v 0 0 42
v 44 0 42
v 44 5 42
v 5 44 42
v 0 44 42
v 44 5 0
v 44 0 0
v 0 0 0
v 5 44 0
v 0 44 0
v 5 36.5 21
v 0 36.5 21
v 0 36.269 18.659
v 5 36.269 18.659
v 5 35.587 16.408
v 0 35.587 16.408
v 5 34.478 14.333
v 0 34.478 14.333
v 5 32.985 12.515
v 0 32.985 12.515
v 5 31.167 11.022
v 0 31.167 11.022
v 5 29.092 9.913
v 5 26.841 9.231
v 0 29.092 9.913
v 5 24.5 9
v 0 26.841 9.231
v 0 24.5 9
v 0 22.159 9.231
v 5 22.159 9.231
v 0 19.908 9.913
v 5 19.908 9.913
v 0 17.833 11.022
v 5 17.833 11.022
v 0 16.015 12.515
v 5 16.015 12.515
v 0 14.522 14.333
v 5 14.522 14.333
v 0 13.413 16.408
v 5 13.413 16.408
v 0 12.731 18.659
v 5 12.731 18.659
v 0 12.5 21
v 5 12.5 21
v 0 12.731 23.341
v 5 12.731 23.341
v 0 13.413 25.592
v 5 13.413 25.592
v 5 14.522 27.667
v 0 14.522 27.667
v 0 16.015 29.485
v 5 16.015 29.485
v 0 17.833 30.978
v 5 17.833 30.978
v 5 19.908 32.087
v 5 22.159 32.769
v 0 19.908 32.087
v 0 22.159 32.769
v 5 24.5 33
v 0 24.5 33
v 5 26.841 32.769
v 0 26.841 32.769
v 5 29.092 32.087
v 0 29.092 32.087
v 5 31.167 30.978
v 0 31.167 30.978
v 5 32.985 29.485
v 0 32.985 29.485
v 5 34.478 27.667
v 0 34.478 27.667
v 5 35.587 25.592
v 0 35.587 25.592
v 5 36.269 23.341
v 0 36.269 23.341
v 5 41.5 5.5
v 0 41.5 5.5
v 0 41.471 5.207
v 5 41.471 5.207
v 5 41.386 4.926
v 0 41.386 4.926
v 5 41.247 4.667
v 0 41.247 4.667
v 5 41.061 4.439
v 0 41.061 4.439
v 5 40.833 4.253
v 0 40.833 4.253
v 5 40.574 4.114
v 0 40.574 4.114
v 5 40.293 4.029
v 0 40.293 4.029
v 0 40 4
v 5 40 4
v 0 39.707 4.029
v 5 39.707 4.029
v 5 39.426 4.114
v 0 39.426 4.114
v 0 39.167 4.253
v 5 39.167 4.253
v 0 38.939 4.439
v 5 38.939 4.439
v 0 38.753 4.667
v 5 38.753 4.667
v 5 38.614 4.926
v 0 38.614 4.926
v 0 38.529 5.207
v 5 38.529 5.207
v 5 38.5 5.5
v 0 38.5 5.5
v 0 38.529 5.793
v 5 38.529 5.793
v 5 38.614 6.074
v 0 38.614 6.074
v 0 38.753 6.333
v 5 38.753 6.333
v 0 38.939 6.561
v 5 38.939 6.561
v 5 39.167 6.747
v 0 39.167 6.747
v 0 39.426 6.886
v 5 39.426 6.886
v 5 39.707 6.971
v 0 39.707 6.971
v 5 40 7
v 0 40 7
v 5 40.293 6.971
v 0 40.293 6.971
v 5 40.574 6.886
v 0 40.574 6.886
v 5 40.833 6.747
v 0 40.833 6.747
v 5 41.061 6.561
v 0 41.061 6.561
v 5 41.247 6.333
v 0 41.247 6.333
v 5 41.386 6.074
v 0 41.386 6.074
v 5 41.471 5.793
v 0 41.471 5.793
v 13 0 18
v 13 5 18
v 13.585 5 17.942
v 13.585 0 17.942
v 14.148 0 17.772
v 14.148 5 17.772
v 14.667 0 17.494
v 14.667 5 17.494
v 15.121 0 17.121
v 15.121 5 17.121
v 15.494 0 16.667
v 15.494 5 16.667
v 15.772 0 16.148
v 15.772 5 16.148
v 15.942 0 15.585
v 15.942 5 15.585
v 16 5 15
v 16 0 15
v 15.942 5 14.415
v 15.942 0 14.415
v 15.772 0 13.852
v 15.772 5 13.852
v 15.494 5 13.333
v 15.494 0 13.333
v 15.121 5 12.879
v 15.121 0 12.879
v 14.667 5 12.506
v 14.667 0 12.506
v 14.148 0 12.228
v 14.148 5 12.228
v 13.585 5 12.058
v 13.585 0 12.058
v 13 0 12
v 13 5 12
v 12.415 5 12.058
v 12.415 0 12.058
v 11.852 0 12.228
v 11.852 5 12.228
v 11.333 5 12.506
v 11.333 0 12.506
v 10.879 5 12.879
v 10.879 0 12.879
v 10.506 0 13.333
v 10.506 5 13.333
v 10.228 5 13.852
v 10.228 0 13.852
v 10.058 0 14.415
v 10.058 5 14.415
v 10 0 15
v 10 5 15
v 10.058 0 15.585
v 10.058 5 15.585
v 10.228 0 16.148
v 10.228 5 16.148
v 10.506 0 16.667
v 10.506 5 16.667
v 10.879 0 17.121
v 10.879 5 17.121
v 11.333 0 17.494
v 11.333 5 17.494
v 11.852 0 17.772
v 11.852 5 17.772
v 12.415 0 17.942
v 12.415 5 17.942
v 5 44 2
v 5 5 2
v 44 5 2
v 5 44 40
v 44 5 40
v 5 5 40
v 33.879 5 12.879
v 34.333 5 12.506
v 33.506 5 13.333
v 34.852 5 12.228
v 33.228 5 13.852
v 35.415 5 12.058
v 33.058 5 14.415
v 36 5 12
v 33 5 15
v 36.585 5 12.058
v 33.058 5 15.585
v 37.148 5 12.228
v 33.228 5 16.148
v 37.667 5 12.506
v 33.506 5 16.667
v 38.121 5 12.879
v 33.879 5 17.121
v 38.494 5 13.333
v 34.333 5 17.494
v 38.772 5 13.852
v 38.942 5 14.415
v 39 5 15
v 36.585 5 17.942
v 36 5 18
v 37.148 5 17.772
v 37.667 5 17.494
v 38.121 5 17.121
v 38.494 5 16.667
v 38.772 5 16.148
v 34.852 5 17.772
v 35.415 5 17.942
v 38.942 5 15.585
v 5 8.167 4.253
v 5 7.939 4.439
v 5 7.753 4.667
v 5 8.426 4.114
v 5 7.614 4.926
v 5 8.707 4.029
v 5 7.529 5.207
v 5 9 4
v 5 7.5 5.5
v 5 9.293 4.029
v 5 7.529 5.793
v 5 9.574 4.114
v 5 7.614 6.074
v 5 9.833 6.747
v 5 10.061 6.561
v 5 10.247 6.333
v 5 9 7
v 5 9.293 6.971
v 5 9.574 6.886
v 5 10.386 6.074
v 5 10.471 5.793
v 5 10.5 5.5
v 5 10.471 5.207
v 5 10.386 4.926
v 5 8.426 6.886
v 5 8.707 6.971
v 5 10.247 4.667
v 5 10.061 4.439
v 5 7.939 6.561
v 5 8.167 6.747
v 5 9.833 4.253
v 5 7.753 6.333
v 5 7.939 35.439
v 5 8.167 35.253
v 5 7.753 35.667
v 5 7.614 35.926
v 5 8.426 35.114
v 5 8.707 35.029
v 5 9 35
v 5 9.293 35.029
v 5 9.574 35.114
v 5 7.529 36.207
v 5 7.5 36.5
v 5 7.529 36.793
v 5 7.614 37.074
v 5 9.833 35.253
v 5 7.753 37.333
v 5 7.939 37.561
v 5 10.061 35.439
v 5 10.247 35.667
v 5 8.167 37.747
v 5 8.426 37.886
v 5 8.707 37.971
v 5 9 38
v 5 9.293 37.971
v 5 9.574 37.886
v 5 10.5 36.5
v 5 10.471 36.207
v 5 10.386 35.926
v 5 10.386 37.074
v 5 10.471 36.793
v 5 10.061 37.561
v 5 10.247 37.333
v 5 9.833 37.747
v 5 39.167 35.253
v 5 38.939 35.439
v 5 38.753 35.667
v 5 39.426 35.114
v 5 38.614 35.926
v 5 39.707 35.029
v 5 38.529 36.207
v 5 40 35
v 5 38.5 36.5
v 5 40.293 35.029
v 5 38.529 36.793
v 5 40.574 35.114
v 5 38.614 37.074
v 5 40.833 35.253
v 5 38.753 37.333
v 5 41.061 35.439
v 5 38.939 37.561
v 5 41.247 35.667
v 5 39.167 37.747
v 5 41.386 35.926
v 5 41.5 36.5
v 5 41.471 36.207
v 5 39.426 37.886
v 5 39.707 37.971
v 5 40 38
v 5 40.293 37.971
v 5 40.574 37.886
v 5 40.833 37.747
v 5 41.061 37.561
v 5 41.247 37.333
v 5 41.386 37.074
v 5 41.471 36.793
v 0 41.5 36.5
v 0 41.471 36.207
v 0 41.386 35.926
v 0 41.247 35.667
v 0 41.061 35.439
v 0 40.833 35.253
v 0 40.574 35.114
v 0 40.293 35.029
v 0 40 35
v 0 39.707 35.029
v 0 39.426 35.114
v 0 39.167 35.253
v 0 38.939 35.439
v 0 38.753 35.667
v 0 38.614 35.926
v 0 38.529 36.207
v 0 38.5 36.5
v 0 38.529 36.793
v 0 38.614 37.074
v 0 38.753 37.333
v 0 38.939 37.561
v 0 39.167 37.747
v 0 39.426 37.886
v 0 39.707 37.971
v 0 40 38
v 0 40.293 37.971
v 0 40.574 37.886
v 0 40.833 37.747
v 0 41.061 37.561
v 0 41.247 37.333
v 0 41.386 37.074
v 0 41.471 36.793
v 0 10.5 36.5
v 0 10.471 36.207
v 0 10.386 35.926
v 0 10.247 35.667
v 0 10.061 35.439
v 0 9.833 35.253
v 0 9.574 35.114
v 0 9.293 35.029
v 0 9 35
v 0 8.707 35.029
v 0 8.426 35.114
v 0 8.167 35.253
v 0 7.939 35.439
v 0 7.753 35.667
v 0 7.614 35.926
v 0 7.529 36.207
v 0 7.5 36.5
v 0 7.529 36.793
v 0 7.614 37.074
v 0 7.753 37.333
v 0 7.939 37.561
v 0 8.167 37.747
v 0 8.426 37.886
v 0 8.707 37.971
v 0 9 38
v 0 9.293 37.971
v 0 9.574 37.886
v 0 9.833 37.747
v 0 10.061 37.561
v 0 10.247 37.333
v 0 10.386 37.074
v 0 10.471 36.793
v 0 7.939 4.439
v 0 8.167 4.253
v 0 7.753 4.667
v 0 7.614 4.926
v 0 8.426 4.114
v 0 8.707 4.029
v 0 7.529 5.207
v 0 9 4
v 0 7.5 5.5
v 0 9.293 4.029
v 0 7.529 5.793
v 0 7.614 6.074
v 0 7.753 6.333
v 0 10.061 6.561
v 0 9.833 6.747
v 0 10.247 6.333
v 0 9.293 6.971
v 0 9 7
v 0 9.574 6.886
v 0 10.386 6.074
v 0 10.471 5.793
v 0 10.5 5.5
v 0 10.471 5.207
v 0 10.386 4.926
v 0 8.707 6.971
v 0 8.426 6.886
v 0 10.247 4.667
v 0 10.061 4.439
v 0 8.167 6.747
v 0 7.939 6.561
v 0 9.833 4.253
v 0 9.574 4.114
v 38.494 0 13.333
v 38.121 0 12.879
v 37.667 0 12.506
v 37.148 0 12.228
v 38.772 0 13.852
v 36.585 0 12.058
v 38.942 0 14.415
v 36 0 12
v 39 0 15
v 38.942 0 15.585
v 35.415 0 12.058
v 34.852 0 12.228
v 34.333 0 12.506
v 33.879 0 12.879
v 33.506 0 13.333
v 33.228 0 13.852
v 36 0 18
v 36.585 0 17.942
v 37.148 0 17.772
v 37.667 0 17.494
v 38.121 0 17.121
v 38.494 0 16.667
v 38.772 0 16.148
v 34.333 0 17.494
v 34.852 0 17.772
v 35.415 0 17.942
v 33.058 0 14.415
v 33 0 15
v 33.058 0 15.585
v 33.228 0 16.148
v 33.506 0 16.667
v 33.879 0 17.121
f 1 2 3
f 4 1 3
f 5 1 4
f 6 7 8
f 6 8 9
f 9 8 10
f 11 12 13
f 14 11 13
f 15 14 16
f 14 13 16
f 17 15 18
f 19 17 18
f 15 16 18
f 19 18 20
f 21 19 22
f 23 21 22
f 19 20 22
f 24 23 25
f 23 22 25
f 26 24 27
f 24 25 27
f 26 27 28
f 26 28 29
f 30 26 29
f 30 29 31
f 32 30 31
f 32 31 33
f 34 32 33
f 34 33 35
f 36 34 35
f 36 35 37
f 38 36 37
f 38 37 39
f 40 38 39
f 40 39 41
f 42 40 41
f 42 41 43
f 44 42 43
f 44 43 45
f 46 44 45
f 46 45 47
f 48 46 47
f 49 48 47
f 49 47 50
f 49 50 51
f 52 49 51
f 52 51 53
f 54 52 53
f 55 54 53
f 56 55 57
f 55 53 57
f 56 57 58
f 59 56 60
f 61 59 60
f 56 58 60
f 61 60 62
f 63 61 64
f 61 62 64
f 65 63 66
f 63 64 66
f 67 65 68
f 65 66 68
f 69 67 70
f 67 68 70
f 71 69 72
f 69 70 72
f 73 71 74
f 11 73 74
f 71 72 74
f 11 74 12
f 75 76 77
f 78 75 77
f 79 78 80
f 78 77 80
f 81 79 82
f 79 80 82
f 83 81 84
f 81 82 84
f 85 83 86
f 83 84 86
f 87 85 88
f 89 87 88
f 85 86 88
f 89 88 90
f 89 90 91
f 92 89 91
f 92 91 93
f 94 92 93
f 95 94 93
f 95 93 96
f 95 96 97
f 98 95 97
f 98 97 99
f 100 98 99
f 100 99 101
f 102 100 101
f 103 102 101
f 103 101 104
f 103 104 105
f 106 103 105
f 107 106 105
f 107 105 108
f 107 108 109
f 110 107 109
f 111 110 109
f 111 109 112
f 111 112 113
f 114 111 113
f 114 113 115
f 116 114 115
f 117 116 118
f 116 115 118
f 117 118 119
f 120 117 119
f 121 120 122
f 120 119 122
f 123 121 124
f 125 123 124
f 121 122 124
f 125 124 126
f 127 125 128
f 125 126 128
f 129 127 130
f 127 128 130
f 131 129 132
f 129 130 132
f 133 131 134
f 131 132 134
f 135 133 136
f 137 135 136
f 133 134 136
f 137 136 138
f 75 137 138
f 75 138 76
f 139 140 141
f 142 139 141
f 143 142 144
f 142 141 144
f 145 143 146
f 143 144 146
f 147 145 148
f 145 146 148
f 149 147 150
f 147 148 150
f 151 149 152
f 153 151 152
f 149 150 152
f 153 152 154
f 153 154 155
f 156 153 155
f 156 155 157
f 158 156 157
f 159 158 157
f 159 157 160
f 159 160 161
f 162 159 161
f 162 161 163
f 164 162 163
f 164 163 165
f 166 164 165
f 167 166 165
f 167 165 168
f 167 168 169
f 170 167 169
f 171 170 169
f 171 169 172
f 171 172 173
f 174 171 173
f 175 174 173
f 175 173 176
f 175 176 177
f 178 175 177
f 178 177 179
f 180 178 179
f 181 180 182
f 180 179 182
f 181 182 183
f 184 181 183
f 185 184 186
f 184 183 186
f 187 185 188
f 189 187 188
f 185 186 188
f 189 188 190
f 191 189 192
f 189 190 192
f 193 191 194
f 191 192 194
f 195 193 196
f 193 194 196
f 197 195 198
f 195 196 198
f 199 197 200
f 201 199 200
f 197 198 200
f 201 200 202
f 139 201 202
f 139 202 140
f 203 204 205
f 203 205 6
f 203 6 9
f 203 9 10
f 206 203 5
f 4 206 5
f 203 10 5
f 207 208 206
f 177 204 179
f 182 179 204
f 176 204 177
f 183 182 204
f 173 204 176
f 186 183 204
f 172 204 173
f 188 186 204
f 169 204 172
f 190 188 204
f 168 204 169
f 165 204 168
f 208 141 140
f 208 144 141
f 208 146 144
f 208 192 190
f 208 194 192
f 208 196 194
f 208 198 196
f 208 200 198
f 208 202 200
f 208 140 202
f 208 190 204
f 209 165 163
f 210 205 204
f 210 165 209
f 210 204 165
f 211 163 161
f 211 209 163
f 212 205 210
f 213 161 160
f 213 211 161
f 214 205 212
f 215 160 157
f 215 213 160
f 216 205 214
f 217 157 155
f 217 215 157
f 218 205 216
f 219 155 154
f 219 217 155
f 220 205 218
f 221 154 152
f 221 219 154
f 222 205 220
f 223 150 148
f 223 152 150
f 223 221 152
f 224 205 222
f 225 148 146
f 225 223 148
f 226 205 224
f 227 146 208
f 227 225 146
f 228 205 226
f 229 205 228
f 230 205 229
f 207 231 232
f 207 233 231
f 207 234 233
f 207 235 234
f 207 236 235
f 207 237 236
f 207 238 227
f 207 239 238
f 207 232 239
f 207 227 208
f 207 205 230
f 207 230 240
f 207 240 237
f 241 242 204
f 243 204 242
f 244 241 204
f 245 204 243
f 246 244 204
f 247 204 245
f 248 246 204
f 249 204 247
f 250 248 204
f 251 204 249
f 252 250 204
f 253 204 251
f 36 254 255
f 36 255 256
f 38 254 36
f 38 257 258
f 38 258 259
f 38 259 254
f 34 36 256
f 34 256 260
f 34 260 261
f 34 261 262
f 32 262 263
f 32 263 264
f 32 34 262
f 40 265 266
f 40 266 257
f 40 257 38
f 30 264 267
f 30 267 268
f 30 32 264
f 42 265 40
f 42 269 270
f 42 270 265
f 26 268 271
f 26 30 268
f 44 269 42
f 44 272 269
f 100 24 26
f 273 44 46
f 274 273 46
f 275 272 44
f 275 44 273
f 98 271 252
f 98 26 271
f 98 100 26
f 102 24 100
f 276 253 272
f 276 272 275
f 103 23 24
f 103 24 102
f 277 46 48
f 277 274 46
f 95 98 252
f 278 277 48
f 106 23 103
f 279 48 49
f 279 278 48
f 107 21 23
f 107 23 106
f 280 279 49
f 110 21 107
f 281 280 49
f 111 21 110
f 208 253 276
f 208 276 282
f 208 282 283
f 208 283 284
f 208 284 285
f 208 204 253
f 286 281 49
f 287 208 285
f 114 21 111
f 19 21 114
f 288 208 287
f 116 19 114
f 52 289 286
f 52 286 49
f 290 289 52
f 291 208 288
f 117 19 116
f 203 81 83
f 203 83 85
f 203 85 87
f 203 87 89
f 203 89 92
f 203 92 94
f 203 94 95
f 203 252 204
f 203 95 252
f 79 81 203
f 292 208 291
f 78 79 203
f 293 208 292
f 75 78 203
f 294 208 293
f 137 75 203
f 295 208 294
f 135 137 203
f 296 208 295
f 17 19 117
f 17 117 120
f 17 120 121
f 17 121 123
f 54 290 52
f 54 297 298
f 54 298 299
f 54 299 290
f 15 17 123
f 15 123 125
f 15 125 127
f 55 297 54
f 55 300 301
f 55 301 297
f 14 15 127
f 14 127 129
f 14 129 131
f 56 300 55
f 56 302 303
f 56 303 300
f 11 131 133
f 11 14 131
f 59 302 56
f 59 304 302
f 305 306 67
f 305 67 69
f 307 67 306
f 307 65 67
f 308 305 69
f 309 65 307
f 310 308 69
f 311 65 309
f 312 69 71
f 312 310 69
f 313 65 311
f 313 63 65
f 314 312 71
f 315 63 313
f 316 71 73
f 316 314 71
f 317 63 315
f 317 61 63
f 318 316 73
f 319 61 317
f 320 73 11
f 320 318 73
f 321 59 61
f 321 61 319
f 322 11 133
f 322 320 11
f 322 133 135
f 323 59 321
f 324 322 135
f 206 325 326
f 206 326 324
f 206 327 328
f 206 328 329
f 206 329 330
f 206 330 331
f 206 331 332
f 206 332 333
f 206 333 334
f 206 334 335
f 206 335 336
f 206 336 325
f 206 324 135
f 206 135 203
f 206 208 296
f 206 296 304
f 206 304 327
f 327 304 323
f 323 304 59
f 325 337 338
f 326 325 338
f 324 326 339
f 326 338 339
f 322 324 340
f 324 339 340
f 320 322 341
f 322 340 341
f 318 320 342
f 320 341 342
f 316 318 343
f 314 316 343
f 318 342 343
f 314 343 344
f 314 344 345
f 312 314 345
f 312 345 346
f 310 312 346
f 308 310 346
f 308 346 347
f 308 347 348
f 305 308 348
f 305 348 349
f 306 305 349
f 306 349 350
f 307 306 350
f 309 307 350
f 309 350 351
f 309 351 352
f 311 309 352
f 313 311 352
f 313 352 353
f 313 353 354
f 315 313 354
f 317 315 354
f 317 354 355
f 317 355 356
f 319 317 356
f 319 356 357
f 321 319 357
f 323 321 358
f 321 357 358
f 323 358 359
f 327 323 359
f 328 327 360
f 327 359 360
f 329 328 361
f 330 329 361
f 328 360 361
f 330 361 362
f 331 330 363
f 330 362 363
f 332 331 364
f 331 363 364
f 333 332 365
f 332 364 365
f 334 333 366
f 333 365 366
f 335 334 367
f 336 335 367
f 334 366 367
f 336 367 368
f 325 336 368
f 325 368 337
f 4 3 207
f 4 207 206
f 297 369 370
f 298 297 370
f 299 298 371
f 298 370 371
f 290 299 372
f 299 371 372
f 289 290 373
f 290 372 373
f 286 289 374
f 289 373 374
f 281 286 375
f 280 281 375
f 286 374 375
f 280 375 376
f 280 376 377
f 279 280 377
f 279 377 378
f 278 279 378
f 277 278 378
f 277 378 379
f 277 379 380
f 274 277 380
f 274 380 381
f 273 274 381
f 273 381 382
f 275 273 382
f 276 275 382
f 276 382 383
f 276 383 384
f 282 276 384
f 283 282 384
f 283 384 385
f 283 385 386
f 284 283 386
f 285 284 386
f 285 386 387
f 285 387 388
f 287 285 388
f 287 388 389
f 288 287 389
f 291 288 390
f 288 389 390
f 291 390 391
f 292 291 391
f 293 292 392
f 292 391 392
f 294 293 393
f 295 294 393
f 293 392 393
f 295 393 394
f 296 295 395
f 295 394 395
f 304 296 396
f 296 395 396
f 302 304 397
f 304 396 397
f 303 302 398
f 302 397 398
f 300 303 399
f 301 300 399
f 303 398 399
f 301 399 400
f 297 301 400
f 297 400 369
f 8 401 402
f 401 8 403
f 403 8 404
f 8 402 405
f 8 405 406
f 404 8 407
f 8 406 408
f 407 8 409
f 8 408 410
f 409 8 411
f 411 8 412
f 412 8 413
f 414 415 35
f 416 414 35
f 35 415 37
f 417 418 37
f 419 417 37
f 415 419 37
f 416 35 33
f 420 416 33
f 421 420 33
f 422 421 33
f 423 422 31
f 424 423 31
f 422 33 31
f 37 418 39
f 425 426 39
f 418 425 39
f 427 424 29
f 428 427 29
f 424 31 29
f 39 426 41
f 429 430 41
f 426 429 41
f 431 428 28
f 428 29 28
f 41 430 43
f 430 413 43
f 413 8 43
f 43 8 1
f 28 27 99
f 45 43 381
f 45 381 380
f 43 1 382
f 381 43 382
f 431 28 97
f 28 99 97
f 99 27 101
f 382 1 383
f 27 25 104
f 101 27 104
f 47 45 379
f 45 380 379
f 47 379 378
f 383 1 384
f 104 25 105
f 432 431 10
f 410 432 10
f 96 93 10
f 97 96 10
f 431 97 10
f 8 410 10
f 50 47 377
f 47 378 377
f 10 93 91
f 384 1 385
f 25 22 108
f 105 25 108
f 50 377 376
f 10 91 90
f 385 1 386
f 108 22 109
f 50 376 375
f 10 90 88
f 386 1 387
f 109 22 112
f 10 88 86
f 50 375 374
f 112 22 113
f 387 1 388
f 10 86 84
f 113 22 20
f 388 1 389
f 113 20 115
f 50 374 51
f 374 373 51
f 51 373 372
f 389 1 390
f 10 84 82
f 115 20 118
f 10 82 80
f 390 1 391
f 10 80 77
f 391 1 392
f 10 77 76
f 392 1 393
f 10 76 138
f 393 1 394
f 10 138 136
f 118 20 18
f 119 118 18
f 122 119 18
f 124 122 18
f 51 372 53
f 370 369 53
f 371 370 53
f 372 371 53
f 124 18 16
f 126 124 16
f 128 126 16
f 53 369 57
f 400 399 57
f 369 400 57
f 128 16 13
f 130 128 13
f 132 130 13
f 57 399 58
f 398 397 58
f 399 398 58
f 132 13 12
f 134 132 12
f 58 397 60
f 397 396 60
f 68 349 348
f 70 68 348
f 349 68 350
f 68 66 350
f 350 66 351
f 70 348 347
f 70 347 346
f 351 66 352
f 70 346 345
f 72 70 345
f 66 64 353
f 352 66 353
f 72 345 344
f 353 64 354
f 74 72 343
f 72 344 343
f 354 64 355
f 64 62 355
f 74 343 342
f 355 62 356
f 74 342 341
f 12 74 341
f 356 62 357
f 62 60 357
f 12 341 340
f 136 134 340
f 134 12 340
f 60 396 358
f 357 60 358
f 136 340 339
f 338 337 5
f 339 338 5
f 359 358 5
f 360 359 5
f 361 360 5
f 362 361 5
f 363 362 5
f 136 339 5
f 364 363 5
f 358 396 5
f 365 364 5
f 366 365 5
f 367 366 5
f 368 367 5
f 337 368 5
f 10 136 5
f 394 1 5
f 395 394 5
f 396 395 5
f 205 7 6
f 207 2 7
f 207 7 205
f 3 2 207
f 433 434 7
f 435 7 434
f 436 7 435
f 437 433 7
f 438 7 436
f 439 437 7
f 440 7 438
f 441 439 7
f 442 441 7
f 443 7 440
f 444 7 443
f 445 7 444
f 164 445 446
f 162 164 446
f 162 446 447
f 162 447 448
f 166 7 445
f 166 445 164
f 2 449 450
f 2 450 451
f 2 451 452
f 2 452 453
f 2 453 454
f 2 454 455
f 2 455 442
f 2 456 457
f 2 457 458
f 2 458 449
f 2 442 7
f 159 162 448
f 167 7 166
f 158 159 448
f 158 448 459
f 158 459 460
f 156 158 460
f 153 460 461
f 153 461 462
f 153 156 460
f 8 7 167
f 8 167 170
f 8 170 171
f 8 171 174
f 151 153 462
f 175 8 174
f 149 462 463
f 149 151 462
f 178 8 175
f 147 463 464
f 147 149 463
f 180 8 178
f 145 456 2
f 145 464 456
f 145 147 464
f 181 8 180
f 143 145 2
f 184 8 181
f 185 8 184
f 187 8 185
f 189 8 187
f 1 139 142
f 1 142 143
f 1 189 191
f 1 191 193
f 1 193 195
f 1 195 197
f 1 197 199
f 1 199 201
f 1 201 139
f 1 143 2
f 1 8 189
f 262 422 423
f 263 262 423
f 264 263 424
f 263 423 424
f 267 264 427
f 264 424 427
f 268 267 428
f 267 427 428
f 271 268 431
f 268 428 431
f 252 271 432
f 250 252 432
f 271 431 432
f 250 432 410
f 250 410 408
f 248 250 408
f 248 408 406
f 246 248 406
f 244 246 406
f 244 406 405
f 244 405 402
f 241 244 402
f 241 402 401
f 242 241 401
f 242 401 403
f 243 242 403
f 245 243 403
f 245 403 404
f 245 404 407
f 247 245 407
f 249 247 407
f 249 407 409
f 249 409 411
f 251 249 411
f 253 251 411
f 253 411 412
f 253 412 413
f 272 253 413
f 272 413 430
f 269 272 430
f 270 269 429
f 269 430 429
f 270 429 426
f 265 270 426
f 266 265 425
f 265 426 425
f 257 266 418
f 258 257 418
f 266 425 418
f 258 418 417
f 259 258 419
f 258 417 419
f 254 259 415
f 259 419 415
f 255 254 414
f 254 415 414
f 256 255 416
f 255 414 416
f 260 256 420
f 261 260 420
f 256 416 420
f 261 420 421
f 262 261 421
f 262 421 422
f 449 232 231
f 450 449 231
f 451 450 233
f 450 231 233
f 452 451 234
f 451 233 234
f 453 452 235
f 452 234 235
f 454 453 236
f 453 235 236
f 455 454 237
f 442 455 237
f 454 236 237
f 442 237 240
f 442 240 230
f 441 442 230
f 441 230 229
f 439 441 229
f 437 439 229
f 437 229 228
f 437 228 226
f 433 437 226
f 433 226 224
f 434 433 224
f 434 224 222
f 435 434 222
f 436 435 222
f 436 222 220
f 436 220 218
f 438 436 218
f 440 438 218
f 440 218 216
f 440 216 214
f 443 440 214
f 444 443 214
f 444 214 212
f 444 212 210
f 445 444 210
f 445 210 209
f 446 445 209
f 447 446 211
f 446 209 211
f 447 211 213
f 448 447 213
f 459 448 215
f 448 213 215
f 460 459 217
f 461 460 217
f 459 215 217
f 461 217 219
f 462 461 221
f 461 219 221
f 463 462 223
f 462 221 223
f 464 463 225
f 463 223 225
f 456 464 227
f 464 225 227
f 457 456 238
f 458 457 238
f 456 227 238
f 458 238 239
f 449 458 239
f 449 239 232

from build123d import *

# Parameters (mm, degrees)
SKETCH_W        = 44
SKETCH_H        = 42.000069
PAD_DEPTH       = 44
SKETCH001_W     = 39
SKETCH001_H     = 38.000069
POCKET_DEPTH    = 39
POCKET001_DEPTH = 42.001069
SKETCH003_R     = 1.5
SKETCH003_R_2   = 12
POCKET002_DEPTH = 44.001
SKETCH004_R     = 3
POCKET003_DEPTH = 5.001


with BuildPart() as part:
    # Sketch → Pad (new body)
    with BuildSketch(Plane.YZ):
        with Locations((22, 21.000034)):
            Rectangle(SKETCH_W, SKETCH_H)
    extrude(amount=PAD_DEPTH)

    # Sketch001 (on Face6 of Pad) → Pocket (cut)
    with BuildSketch(Plane.YZ.offset(44)):
        with Locations((24.5, 21.000034)):
            Rectangle(SKETCH001_W, SKETCH001_H)
    extrude(amount=-POCKET_DEPTH, mode=Mode.SUBTRACT)

    # Sketch002 (on Face6 of Pocket) → Pocket001 (cut, through all)
    with BuildSketch(Plane(origin=(0, 0, 42.000069), x_dir=(0, -1, 0), z_dir=(0, 0, 1))):
        Polygon((-44, 5), (-44, 44), (-5, 44), align=None)
    extrude(amount=-POCKET001_DEPTH, mode=Mode.SUBTRACT)

    # Sketch003 (on Face2 of Pocket001) → Pocket002 (cut, through all)
    with BuildSketch(Plane(origin=(0, 0, 0), x_dir=(0, 1, 0), z_dir=(-1, 0, 0))):
        with Locations((9, -5.500034)):
            Circle(SKETCH003_R)
        with Locations((40, -5.500034)):
            Circle(SKETCH003_R)
        with Locations((9, -36.500034)):
            Circle(SKETCH003_R)
        with Locations((40, -36.500034)):
            Circle(SKETCH003_R)
        with Locations((24.5, -21.000034)):
            Circle(SKETCH003_R_2)
    extrude(amount=-POCKET002_DEPTH, mode=Mode.SUBTRACT)

    # Sketch004 (on Face16 of Pocket002) → Pocket003 (cut, through all)
    with BuildSketch(Plane.ZX.offset(5)):
        with Locations((15, 36)):
            Circle(SKETCH004_R)
        with Locations((15, 13)):
            Circle(SKETCH004_R)
    extrude(amount=-POCKET003_DEPTH, mode=Mode.SUBTRACT)


solid = part.part
